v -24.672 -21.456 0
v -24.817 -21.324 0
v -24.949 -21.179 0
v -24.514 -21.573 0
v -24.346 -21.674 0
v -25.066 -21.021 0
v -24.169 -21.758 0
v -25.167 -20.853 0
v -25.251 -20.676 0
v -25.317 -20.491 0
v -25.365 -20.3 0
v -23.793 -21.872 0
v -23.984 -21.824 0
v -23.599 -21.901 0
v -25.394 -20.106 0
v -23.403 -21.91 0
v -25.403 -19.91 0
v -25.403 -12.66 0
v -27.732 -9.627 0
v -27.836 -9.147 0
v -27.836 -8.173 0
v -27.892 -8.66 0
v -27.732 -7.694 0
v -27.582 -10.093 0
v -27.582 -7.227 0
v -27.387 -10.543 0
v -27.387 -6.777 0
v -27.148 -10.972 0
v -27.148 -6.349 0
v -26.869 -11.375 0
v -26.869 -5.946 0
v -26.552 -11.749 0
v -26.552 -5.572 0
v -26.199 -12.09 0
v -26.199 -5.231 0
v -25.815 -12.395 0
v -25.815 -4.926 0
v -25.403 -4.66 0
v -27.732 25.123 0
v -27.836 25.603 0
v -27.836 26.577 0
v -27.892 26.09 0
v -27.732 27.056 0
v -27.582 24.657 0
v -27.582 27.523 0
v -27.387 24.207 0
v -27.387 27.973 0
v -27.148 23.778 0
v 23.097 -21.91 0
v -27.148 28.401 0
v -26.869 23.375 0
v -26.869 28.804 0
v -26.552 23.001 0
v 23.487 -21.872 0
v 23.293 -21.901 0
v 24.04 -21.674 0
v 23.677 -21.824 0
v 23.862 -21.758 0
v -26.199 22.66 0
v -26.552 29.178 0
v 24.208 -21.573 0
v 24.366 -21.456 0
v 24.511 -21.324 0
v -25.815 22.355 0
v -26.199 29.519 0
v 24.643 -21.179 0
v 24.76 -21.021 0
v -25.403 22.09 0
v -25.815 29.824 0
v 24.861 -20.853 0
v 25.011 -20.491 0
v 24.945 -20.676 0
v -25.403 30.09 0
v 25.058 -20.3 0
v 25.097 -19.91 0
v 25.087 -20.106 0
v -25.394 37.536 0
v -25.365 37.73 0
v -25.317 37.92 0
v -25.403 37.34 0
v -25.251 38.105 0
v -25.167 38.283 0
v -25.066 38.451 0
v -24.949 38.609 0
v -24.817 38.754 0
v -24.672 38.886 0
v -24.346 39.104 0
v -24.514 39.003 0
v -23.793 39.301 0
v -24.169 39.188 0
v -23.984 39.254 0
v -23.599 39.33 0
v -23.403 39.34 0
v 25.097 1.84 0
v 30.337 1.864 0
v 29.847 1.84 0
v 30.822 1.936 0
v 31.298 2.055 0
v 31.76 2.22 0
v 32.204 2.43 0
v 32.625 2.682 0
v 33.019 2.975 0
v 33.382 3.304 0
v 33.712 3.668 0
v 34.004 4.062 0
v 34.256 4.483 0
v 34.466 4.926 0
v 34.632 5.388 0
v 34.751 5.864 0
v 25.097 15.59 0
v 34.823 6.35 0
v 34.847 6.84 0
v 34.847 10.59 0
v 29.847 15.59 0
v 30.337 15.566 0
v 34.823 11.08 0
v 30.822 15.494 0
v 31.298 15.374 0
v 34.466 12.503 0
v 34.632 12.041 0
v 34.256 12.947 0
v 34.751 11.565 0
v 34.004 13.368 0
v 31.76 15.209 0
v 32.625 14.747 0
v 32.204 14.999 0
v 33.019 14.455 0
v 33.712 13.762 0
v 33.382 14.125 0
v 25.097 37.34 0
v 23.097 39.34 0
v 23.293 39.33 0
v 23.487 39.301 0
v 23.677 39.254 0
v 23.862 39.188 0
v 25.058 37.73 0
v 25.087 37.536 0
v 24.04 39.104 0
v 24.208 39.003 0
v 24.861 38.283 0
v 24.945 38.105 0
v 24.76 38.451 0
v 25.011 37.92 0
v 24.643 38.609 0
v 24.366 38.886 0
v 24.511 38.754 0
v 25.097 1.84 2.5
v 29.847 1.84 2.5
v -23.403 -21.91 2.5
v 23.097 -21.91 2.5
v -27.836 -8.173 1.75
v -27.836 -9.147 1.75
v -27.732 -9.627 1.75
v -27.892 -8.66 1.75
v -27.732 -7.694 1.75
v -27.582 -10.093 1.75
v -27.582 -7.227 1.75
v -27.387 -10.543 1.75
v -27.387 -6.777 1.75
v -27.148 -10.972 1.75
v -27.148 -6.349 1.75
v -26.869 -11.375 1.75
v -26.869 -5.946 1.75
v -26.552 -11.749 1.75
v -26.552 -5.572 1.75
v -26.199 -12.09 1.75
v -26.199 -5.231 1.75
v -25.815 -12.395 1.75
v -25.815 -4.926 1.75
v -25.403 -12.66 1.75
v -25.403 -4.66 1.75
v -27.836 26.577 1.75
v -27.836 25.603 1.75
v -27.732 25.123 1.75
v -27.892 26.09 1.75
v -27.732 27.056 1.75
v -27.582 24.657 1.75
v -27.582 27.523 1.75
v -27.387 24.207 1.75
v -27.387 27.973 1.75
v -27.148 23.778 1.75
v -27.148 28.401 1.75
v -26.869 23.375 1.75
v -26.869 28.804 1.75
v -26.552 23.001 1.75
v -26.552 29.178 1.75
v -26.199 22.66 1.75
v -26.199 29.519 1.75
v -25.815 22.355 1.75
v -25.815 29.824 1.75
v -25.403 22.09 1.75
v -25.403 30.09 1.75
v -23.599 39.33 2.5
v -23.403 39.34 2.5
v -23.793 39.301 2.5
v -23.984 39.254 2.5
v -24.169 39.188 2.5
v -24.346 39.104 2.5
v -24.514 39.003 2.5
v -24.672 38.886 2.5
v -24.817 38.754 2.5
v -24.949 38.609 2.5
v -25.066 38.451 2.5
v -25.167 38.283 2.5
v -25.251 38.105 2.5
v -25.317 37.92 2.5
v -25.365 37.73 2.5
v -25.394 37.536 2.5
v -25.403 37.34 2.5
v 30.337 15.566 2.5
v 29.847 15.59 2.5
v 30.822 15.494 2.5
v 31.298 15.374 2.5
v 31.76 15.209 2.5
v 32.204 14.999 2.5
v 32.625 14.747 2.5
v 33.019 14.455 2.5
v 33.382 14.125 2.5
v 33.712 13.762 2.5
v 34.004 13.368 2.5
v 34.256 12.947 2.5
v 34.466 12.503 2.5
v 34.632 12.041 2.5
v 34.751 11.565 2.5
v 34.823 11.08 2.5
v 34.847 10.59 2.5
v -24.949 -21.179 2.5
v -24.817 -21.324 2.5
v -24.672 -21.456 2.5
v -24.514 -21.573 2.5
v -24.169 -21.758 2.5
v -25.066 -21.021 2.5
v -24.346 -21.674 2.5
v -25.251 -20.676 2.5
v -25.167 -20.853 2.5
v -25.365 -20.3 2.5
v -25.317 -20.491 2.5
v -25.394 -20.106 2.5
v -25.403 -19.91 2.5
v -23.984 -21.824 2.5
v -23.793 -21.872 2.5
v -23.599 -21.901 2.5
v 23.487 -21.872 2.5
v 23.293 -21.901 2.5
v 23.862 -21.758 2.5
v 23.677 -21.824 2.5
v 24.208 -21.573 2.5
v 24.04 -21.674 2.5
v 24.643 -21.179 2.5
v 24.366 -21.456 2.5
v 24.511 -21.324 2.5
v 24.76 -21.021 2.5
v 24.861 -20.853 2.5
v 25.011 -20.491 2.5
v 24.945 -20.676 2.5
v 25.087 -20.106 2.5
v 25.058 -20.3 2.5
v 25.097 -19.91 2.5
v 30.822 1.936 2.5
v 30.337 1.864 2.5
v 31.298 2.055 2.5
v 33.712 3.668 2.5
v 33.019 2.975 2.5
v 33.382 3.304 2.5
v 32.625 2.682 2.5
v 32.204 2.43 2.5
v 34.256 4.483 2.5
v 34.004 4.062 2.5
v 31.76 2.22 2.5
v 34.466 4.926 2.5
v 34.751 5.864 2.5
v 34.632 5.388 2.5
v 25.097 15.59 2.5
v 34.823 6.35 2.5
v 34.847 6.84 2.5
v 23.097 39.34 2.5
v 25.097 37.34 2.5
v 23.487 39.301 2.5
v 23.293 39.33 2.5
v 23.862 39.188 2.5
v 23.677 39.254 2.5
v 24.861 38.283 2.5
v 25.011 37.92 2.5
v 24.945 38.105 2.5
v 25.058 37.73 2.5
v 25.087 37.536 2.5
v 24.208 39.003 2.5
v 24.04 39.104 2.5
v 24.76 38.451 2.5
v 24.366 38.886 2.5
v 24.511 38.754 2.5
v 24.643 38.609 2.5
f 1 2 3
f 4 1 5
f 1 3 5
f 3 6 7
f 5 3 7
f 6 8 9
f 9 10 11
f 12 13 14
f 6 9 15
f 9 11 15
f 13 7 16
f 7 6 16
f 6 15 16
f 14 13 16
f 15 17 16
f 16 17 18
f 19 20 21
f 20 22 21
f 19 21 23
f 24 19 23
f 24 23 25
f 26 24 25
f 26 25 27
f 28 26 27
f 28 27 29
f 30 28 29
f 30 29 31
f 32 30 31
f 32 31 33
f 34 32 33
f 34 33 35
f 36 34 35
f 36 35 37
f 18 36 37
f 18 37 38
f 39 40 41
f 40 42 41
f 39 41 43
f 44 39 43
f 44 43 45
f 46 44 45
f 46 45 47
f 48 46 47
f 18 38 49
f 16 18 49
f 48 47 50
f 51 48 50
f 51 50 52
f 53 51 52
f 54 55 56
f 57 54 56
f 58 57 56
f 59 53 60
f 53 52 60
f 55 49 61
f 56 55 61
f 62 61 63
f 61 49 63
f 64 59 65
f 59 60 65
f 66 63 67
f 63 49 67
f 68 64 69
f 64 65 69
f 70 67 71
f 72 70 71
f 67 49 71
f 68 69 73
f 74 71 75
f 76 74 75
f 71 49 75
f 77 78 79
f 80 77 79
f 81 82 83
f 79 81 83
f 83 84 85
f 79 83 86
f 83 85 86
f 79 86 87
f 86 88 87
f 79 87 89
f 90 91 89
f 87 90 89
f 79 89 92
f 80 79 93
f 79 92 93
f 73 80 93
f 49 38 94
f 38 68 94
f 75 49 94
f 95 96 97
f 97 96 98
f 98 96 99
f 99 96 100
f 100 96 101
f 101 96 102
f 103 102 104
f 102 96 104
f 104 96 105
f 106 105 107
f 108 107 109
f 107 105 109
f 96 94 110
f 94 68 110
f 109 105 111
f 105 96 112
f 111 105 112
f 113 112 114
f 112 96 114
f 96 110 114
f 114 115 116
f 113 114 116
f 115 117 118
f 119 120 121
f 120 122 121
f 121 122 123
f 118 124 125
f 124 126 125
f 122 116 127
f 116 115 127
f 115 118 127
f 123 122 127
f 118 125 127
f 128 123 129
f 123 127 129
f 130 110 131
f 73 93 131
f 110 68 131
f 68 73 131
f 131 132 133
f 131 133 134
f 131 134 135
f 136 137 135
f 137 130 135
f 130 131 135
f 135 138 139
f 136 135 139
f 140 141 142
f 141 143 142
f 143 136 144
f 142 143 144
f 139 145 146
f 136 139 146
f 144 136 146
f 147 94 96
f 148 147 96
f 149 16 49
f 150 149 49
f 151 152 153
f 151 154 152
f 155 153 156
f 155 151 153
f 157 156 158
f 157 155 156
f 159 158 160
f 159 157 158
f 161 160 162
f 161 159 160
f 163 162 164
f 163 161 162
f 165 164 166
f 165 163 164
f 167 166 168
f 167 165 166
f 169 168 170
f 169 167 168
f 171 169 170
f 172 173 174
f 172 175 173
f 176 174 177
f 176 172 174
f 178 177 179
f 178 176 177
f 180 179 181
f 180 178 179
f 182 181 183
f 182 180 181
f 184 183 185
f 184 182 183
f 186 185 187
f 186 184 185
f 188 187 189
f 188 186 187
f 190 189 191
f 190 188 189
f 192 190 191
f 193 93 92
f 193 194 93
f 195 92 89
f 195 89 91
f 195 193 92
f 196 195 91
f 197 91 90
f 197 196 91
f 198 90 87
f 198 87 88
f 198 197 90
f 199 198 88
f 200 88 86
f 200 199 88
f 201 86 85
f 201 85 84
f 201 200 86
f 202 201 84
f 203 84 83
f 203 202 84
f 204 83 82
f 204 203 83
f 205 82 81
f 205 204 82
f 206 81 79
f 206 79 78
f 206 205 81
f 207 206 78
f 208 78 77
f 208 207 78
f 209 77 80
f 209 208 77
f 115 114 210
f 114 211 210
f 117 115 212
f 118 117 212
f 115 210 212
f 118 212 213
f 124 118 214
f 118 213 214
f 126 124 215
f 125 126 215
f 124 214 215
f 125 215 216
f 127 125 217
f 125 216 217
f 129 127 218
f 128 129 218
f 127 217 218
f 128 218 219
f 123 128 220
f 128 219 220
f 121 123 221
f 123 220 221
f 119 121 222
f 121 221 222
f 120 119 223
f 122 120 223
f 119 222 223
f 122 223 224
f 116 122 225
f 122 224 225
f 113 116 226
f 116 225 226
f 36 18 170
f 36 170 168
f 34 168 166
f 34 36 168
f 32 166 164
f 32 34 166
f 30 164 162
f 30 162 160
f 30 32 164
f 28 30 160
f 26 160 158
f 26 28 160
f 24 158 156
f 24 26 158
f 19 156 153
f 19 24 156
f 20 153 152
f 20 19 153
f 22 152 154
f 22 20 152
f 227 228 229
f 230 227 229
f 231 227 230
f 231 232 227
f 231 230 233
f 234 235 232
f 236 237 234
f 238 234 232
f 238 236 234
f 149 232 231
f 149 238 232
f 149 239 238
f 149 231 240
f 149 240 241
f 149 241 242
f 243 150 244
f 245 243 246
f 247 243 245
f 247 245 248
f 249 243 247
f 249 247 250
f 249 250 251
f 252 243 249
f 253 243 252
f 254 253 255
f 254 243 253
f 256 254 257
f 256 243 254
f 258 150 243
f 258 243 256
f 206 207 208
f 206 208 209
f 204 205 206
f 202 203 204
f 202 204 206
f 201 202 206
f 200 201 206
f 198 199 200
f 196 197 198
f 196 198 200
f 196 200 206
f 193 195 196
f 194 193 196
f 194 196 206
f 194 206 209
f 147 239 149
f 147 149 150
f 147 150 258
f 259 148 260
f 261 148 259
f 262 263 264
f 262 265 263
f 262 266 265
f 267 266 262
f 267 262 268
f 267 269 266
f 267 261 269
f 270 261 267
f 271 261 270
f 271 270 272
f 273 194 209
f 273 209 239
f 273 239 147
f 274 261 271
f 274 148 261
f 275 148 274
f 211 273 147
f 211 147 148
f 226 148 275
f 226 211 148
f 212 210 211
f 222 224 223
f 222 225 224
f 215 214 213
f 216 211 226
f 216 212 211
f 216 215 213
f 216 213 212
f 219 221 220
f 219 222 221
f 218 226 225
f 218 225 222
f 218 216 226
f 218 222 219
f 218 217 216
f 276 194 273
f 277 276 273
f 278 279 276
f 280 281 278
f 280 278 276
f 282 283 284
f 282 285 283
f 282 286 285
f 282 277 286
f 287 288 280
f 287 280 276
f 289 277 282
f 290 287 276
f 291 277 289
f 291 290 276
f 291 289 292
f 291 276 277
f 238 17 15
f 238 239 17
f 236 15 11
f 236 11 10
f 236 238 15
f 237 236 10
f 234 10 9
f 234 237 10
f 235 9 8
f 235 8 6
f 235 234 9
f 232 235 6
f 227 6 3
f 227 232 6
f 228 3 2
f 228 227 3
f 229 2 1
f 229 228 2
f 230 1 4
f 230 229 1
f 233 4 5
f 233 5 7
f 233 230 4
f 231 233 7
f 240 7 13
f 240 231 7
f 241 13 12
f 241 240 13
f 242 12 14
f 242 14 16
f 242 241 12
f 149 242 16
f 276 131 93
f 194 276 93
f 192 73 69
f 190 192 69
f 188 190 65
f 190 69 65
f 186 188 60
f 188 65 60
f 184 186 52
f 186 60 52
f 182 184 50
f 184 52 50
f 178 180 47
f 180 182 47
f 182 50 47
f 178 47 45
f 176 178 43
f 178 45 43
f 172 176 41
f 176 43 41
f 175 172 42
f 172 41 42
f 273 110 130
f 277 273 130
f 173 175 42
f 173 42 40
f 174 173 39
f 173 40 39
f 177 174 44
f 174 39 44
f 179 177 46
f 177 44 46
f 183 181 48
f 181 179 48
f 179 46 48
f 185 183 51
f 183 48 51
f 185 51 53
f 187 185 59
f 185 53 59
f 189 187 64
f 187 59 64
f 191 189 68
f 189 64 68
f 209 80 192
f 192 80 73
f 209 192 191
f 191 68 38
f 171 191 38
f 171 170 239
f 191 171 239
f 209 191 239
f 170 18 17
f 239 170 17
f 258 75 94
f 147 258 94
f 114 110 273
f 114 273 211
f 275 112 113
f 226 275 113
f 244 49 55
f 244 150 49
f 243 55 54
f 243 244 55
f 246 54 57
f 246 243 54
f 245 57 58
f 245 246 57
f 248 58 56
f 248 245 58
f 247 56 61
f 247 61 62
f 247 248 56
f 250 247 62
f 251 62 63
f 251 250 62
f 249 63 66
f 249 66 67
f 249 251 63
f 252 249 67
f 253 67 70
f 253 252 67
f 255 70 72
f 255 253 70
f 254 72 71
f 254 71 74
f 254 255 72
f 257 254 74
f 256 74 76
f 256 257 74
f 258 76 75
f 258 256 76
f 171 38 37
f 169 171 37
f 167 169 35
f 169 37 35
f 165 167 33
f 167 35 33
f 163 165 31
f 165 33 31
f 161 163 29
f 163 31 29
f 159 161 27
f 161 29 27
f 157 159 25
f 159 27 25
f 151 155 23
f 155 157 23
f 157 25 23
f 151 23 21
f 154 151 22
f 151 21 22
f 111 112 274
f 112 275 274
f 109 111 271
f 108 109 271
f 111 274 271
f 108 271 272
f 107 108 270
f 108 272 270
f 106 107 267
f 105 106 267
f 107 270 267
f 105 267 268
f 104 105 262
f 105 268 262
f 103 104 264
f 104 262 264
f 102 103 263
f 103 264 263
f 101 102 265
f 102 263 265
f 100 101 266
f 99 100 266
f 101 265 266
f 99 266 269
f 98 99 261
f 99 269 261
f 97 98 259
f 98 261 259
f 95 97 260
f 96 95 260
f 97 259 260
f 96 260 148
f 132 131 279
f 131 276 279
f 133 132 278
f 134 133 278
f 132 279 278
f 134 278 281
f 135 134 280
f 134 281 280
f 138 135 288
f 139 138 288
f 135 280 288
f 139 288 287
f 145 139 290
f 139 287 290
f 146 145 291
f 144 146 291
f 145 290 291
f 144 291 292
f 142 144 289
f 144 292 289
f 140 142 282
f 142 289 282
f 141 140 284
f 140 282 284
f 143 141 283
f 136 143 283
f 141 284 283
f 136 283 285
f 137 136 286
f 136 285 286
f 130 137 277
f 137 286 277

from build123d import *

# Parameters (mm, degrees)
F0_W        = 9.75
F0_H        = 13.75
F1_DEPTH    = 2.5
F0_W_2      = 2.5
F0_H_2      = 8
F2_DEPTH    = 1.75
F3_R        = 2
F4_R        = 5
F5_T1_DEPTH = 23.4006350946


# Not quite as in the source:
# - a fillet or chamfer that OpenCascade refuses, or shapes differently, is made with other operations: its cross-section is extruded or revolved along the edge and cut away or added


with BuildPart() as f1:
    # F0 (on Top) → F1 (new body)
    with BuildSketch(Plane.XY):
        Polygon((25.0968417823, 39.3397479696), (-25.4031582177, 39.3397479696), (-25.4031582177, 30.0897479696), (-25.4031582177, 22.0897479696), (-25.4031582177, -4.6602520304), (-25.4031582177, -12.6602520304), (-25.4031582177, -21.9102520304), (25.0968417823, -21.9102520304), (25.0968417823, 1.8397479696), (25.0968417823, 15.5897479696), align=None)
        with Locations((29.9718417823, 8.7147479696)):
            Rectangle(F0_W, F0_H)
    extrude(amount=F1_DEPTH)

    # F0 (on Top) → F2 (join)
    with BuildSketch(Plane.XY):
        with Locations((-26.6531582177, 26.0897479696)):
            Rectangle(F0_W_2, F0_H_2)
        with Locations((-26.6531582177, -8.6602520304)):
            Rectangle(F0_W_2, F0_H_2)
    extrude(amount=F2_DEPTH)

    # F3
    f3_edges = [f1.edges().sort_by_distance(p)[0] for p in [
        (-25.403158, 39.339748, 1.25),
        (-25.403158, -21.910252, 1.25),
        (25.096842, -21.910252, 1.25),
        (25.096842, 39.339748, 1.25),
    ]]
    fillet(f3_edges, radius=F3_R)

    # F4
    f4_edges = [f1.edges().sort_by_distance(p)[0] for p in [
        (34.846842, 1.839748, 1.25),
        (34.846842, 15.589748, 1.25),
    ]]
    fillet(f4_edges, radius=F4_R)

    # F5: fillet of radius 5 on 4 edges, made by hand

    # F5_s2 → F5_t1 (cut)
    with BuildSketch(Plane.XY.offset(-10.8253175473)):
        with BuildLine():
            ThreePointArc((-25.4031582177, 30.0897479696), (-27.2332852366, 28.2596209506), (-27.9031582177, 25.7596209506))
            Line((-27.9031582177, 25.7596209506), (-27.9031582177, 30.0897479696))
            Line((-27.9031582177, 30.0897479696), (-25.4031582177, 30.0897479696))
        make_face()
        with BuildLine():
            ThreePointArc((-27.9031582177, 26.4198749885), (-27.2332852366, 23.9198749885), (-25.4031582177, 22.0897479696))
            Line((-25.4031582177, 22.0897479696), (-27.9031582177, 22.0897479696))
            Line((-27.9031582177, 22.0897479696), (-27.9031582177, 26.4198749885))
        make_face()
        with BuildLine():
            ThreePointArc((-25.4031582177, -4.6602520304), (-27.2332852366, -6.4903790494), (-27.9031582177, -8.9903790494))
            Line((-27.9031582177, -8.9903790494), (-27.9031582177, -4.6602520304))
            Line((-27.9031582177, -4.6602520304), (-25.4031582177, -4.6602520304))
        make_face()
        with BuildLine():
            ThreePointArc((-25.4031582177, -12.6602520304), (-27.2332852366, -10.8301250115), (-27.9031582177, -8.3301250115))
            Line((-27.9031582177, -8.3301250115), (-27.9031582177, -12.6602520304))
            Line((-27.9031582177, -12.6602520304), (-25.4031582177, -12.6602520304))
        make_face()
    extrude(amount=F5_T1_DEPTH, mode=Mode.SUBTRACT)


solid = f1.part
